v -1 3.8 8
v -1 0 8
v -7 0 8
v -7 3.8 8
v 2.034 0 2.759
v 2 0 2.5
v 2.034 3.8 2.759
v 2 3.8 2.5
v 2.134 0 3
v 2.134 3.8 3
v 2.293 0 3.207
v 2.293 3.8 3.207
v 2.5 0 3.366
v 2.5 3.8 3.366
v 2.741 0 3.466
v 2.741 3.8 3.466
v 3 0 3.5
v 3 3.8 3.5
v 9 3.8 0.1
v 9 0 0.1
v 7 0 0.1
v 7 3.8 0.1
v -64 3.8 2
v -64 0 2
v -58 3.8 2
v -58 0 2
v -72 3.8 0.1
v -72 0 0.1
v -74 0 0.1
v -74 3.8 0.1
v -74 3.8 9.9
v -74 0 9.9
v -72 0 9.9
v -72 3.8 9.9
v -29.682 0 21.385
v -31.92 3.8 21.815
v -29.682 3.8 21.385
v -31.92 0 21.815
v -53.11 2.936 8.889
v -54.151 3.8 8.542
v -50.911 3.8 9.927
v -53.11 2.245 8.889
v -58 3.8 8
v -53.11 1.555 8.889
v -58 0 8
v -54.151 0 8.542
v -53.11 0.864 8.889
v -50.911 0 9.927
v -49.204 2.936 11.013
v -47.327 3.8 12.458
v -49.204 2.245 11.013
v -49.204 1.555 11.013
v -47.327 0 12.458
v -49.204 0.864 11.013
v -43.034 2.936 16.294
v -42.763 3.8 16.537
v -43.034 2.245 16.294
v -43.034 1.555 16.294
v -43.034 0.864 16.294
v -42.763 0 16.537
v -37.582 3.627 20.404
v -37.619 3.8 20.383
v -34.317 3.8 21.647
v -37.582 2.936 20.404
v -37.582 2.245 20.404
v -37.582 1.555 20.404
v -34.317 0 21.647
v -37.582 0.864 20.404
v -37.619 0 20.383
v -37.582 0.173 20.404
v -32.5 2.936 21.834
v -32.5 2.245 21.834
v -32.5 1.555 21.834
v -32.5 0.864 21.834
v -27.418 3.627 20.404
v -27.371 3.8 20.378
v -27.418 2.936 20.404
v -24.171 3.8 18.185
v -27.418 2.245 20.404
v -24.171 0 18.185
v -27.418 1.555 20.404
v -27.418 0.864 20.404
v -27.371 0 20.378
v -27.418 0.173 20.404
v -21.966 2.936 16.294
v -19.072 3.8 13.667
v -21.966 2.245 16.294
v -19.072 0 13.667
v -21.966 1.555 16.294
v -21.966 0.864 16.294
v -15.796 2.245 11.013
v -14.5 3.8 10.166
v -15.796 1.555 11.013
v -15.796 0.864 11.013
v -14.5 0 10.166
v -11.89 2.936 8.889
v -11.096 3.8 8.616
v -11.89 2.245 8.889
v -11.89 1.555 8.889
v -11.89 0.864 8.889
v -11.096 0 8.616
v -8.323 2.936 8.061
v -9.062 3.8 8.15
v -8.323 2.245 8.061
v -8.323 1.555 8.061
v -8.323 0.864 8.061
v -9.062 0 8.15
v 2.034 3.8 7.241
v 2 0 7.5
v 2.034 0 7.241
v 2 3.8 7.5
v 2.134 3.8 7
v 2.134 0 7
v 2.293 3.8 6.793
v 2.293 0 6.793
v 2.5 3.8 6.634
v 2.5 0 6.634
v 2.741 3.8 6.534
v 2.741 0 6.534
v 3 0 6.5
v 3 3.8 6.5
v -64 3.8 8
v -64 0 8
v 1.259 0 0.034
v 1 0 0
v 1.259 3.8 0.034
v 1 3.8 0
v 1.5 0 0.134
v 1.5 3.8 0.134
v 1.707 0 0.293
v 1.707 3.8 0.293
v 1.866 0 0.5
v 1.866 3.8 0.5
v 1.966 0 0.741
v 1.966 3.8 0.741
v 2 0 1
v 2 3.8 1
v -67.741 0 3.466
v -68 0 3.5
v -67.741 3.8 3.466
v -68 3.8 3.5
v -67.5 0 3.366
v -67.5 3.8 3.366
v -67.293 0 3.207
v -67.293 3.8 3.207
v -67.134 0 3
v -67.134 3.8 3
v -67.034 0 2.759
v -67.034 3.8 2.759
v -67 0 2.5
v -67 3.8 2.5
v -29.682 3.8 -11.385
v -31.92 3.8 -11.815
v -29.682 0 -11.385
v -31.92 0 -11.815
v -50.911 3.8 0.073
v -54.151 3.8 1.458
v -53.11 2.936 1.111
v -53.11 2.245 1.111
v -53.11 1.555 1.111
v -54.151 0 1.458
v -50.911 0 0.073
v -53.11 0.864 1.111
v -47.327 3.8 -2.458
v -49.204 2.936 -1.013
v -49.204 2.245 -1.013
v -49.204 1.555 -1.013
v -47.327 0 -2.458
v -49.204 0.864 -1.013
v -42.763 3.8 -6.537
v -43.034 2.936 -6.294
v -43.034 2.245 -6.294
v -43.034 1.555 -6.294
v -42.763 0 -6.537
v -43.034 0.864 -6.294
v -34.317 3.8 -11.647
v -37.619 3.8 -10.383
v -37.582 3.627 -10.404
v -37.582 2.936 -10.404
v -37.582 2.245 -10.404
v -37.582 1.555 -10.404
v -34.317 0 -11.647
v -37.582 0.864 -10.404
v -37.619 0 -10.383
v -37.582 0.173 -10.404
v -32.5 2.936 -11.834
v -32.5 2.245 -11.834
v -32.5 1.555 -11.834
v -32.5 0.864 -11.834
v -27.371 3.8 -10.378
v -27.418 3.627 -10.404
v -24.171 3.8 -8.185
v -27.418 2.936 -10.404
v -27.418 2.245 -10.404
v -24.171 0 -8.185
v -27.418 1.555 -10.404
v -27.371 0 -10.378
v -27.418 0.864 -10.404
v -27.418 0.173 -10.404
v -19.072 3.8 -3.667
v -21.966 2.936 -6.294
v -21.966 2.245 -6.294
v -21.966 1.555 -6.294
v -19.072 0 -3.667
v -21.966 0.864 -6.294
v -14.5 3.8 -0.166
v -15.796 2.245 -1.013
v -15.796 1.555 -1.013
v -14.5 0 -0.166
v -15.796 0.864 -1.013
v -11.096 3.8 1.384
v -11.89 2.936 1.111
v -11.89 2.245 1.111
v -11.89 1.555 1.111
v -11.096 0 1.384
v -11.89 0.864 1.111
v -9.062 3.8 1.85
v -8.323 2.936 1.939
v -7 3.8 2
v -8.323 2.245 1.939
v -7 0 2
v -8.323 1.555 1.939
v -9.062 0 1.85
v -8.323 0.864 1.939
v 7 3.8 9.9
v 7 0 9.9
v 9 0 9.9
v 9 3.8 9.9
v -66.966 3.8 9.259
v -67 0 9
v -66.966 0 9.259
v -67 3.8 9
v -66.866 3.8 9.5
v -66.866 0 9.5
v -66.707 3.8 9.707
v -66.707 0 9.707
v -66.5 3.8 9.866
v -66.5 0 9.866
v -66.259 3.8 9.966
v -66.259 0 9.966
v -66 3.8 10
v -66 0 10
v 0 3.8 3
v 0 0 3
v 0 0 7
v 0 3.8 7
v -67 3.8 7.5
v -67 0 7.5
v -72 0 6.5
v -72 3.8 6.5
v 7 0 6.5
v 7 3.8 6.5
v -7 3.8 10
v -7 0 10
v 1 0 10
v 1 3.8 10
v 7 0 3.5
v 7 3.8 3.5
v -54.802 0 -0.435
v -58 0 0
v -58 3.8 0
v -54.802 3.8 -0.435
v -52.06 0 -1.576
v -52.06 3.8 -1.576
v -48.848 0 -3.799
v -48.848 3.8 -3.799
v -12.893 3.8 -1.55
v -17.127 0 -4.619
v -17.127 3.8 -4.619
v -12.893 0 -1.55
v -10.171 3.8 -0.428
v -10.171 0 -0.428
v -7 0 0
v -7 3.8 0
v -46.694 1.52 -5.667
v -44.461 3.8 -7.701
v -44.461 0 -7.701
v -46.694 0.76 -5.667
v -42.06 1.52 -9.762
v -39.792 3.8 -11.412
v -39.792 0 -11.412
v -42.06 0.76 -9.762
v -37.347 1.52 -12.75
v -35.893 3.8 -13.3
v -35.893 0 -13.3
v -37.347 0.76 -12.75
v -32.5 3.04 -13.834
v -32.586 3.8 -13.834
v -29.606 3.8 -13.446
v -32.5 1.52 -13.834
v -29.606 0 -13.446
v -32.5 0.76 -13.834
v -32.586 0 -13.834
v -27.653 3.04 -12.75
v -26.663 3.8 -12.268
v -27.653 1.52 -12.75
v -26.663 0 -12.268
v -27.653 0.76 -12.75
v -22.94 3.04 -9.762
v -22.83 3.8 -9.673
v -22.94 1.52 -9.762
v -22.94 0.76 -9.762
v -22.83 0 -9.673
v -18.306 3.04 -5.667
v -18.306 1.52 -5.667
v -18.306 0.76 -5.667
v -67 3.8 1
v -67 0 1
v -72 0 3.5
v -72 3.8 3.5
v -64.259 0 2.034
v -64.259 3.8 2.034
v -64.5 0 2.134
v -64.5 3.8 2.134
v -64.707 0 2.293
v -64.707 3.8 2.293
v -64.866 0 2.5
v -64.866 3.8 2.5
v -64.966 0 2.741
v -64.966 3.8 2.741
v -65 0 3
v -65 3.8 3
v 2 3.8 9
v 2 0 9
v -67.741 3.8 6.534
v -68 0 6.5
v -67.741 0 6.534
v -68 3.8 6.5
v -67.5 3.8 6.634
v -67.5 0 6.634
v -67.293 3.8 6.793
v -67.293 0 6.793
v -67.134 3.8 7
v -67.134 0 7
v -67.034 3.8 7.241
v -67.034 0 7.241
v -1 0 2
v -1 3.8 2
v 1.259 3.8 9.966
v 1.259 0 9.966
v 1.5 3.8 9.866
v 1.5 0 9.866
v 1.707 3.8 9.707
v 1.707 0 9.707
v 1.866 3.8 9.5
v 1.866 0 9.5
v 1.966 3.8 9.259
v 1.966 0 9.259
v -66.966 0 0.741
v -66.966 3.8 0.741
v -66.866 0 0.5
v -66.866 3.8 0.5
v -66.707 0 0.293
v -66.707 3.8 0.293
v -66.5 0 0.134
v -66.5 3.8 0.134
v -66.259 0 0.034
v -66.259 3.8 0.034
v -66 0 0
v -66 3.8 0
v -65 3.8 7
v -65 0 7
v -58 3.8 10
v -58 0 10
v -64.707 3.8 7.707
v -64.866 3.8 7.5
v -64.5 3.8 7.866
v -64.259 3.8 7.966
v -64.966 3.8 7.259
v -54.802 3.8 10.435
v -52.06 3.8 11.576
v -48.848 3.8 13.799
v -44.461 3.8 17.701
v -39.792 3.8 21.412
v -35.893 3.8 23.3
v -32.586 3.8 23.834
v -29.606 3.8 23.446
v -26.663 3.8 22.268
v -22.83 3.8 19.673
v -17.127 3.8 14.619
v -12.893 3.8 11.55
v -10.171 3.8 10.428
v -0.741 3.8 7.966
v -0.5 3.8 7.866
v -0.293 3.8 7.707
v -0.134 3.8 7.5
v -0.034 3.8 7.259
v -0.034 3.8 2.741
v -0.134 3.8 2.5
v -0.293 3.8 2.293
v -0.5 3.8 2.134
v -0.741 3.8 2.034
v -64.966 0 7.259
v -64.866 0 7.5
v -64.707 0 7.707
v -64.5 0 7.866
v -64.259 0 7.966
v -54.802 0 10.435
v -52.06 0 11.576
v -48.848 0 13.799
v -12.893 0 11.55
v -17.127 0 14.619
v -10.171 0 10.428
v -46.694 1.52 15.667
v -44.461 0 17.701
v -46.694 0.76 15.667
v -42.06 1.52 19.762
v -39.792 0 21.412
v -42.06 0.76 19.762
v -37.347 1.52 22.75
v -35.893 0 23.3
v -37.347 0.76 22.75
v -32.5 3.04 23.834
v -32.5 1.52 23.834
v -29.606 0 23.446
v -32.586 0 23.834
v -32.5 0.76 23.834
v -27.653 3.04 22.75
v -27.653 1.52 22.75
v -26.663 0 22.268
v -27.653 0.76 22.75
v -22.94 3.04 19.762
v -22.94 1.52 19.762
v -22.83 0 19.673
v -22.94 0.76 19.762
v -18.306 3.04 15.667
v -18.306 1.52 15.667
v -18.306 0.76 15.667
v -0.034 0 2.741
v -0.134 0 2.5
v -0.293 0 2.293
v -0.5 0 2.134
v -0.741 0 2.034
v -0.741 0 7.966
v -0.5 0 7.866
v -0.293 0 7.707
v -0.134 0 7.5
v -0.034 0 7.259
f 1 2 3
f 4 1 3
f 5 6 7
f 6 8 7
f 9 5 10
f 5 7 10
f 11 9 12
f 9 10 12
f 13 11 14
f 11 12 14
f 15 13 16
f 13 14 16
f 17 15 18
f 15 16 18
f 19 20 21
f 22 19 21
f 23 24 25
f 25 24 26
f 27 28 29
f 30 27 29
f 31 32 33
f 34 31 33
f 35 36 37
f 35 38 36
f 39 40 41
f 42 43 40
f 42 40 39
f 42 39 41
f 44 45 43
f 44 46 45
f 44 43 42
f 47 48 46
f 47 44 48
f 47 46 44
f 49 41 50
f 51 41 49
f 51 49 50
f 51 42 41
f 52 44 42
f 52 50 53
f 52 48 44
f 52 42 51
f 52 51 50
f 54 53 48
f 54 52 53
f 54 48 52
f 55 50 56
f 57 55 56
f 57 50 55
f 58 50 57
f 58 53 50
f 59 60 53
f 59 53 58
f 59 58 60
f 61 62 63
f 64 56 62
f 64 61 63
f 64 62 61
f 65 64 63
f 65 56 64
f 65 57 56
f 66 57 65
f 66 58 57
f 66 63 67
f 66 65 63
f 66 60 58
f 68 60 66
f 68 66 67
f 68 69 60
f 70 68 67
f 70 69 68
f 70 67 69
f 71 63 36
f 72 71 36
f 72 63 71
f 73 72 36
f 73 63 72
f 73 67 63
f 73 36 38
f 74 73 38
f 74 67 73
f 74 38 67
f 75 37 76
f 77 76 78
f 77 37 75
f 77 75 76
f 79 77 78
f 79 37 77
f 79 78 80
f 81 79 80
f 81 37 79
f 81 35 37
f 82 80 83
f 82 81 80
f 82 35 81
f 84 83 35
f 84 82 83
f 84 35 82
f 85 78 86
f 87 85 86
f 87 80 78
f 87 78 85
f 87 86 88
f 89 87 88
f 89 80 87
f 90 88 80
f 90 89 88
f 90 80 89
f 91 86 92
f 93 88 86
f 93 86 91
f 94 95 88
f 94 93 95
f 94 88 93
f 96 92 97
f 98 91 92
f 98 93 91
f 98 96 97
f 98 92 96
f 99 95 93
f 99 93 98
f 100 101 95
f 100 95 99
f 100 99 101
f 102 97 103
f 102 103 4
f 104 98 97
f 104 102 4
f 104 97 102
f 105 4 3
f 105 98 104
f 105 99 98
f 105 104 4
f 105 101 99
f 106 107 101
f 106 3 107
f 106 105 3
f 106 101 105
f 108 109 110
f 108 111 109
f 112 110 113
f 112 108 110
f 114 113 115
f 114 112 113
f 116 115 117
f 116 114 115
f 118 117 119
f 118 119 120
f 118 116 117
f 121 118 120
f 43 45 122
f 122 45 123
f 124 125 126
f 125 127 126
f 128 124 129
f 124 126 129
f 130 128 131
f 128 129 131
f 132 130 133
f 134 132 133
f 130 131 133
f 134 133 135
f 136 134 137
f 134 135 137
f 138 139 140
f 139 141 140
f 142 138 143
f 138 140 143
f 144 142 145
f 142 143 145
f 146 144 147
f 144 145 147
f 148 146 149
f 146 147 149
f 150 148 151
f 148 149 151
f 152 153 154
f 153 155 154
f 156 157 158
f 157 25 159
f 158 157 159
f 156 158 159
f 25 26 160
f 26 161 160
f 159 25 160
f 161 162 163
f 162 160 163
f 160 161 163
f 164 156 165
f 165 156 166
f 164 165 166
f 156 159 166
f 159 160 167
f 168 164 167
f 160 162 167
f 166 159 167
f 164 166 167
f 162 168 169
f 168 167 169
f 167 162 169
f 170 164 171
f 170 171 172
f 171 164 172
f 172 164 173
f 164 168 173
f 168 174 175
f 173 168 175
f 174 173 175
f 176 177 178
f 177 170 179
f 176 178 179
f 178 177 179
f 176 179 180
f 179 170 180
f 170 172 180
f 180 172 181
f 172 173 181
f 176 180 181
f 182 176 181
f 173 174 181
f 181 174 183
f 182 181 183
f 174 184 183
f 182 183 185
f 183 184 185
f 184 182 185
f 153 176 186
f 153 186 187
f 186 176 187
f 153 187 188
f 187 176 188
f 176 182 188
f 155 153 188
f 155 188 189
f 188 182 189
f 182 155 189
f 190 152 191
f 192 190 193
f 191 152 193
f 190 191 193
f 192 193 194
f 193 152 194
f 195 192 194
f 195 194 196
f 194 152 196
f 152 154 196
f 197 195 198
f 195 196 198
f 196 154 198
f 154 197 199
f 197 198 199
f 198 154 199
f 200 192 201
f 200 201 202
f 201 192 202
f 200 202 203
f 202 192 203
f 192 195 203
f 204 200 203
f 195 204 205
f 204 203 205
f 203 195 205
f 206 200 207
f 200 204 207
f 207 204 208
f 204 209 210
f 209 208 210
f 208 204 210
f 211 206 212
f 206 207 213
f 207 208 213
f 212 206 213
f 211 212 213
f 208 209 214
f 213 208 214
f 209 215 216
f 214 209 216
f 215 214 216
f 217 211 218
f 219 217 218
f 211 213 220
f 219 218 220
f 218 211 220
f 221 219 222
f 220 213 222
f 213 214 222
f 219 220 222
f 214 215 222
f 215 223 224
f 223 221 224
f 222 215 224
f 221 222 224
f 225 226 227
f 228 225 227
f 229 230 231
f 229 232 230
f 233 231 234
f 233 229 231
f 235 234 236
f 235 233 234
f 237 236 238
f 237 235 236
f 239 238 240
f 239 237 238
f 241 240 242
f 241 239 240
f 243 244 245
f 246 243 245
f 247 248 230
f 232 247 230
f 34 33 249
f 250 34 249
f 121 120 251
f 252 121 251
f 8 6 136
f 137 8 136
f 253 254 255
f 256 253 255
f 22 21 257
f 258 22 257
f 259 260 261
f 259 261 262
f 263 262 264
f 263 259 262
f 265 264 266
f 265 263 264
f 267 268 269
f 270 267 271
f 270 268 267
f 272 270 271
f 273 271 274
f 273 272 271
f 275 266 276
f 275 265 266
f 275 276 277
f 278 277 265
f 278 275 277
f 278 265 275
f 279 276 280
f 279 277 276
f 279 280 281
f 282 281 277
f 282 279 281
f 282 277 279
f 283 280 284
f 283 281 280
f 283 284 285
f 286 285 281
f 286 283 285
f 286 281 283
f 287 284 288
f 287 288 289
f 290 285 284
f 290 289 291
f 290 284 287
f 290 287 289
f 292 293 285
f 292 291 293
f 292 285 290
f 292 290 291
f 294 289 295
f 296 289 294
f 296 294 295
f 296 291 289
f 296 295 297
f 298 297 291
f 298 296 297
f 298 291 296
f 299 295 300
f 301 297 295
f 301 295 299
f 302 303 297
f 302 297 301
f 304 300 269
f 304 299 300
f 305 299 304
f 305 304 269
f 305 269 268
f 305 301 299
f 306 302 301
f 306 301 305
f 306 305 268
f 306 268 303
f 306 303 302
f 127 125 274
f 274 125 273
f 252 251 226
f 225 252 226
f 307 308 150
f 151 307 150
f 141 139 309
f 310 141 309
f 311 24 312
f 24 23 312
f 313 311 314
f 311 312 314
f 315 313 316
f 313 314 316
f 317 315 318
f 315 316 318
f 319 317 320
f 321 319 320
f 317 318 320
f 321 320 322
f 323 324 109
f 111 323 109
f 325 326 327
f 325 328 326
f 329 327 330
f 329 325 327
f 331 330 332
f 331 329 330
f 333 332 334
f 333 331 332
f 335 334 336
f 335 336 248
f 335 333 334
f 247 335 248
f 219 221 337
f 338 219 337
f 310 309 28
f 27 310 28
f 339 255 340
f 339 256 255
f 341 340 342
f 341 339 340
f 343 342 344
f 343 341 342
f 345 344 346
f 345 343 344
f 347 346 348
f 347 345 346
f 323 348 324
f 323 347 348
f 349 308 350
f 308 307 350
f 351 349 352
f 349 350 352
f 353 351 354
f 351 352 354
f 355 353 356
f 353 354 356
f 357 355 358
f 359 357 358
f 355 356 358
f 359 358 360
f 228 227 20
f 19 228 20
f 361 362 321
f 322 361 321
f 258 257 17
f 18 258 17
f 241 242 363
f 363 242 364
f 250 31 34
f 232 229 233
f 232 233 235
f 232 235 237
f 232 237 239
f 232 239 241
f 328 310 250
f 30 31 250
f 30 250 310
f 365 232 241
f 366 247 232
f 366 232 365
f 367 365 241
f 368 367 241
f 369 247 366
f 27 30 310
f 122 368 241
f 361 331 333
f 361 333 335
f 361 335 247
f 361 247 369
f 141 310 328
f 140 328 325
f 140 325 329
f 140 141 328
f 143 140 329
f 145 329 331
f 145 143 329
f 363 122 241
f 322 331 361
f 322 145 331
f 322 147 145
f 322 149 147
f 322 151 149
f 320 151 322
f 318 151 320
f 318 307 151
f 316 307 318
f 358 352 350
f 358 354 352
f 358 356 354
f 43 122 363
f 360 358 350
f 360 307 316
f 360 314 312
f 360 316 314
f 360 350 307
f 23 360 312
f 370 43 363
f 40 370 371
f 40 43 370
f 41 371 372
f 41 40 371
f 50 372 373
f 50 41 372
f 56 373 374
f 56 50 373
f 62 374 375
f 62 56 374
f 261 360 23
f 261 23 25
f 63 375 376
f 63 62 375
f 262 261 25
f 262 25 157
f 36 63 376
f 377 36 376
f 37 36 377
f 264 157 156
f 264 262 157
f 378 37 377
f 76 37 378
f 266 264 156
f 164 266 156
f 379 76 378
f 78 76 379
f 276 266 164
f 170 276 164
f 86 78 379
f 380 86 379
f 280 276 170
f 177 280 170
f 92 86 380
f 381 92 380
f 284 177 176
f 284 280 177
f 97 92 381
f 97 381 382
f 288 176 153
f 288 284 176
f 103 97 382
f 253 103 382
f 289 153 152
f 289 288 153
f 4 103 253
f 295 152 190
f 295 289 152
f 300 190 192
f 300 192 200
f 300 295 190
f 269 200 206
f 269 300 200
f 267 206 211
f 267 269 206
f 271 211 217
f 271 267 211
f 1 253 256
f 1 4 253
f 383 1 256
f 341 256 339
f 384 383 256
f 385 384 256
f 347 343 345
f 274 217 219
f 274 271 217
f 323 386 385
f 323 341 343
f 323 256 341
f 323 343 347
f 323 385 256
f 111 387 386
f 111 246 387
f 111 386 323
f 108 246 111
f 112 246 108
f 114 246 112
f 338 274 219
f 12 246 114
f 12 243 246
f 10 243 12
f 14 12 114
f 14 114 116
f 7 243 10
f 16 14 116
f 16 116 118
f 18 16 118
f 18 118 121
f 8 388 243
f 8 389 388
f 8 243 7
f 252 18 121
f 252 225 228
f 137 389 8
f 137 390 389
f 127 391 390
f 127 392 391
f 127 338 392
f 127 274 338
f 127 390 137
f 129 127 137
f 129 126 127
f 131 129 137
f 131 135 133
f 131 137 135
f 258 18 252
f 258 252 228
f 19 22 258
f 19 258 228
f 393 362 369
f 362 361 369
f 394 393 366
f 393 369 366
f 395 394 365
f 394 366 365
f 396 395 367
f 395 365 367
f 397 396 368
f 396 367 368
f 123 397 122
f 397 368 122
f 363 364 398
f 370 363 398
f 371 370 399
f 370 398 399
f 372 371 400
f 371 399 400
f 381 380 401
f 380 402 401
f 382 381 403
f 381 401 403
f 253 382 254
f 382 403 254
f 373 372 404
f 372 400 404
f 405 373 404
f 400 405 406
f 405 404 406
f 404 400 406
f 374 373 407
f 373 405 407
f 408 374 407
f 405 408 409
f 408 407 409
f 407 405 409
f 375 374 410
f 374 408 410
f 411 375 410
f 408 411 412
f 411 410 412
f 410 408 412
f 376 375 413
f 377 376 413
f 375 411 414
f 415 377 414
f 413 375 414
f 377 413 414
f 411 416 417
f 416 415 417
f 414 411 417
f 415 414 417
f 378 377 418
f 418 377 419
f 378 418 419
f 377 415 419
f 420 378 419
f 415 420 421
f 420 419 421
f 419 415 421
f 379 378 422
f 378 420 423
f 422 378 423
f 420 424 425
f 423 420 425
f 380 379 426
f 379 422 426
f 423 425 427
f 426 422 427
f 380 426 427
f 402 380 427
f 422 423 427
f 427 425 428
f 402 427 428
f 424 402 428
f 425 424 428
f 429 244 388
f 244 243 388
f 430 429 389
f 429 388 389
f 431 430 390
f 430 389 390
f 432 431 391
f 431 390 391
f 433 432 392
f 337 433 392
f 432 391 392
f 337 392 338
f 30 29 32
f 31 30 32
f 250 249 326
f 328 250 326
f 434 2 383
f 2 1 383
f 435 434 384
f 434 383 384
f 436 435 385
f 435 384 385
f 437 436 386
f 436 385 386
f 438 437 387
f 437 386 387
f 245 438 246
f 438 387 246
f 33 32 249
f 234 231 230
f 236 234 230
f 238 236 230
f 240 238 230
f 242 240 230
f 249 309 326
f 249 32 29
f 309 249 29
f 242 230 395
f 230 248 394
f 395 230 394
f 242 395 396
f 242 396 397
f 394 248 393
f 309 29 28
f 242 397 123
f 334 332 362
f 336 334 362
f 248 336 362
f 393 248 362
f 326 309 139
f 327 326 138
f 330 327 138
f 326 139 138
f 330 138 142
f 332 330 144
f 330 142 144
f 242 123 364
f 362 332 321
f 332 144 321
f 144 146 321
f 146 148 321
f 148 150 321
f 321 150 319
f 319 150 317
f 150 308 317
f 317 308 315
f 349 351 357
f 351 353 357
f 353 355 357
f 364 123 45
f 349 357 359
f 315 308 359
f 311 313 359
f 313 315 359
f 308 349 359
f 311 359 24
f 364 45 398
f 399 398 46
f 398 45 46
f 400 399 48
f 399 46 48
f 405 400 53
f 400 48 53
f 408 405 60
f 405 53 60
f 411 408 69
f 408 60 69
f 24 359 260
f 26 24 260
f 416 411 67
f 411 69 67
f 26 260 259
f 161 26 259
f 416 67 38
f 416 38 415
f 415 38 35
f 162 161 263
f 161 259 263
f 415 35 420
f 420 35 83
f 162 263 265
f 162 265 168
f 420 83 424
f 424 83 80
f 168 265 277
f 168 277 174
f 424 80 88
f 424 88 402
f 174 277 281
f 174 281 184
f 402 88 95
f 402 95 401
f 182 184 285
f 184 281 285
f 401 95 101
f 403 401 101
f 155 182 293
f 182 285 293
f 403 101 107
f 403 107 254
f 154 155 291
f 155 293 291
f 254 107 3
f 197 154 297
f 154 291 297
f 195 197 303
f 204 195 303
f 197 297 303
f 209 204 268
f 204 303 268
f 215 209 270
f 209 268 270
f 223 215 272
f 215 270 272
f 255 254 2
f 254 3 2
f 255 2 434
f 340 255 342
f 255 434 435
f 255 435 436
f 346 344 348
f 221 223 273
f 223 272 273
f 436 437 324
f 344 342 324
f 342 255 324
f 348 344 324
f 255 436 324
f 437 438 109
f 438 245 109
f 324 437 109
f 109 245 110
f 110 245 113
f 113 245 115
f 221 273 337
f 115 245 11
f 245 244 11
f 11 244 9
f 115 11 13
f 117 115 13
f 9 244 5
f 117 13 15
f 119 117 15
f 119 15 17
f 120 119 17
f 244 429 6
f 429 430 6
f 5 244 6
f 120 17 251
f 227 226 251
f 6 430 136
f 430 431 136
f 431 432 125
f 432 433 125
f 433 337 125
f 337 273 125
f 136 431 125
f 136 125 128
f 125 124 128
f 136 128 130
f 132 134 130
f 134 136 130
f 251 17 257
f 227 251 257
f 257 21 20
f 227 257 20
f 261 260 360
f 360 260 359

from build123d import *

# Parameters (mm, degrees)
BOSS_EXTRUDE1_DEPTH = 3.8
FILLET1_R           = 1
FILLET2_R           = 1


# Read off the part's stored shape, not the designer's step: Boss-Extrude1
with BuildPart() as part:
    # Boss-Extrude1 outline → Boss-Extrude1 (new body)
    with BuildSketch(Plane(origin=(0, 0, 0), x_dir=(1, 0, 0), z_dir=(0, 1, 0))):
        with BuildLine():
            Line((-67, -3.5), (-72, -3.5))
            Line((-72, -3.5), (-72, -0.1))
            Line((-72, -0.1), (-74, -0.1))
            Line((-74, -0.1), (-74, -9.9))
            Line((-74, -9.9), (-72, -9.9))
            Line((-72, -9.9), (-72, -6.5))
            Line((-72, -6.5), (-67, -6.5))
            Line((-67, -6.5), (-67, -10))
            Line((-67, -10), (-58, -10))
            add(Edge.make_bspline(
                [(-58, -10), (-43, -10), (-43, -32.135135135), (-22, -32.135135135), (-22, -10), (-7, -10)],
                knots=[0, 0, 0, 0, 0, 0, 1, 1, 1, 1, 1, 1], degree=5))
            Line((-7, -10), (2, -10))
            Line((2, -10), (2, -6.5))
            Line((2, -6.5), (7, -6.5))
            Line((7, -6.5), (7, -9.9))
            Line((7, -9.9), (9, -9.9))
            Line((9, -9.9), (9, -0.1))
            Line((9, -0.1), (7, -0.1))
            Line((7, -0.1), (7, -3.5))
            Line((7, -3.5), (2, -3.5))
            Line((2, -3.5), (2, 0))
            Line((2, 0), (-7, 0))
            add(Edge.make_bspline(
                [(-58, 0), (-43, 0), (-43, 22.135135135), (-22, 22.135135135), (-22, 0), (-7, 0)],
                knots=[0, 0, 0, 0, 0, 0, 1, 1, 1, 1, 1, 1], degree=5))
            Line((-58, 0), (-67, 0))
            Line((-67, 0), (-67, -3.5))
        make_face()
        with BuildLine():
            Line((-7, -2), (0, -2))
            Line((0, -2), (0, -8))
            Line((0, -8), (-7, -8))
            add(Edge.make_bspline(
                [(-58, -8), (-57.558618283, -8), (-56.661274976, -8.041762499), (-54.994490556, -8.279551492), (-53.066007456, -8.837716096), (-51.014248285, -9.814804326), (-48.564524406, -11.386984706), (-45.904801681, -13.642773041), (-43.012545098, -16.349497976), (-40.249484403, -18.726076341), (-37.565229513, -20.52340788), (-34.980845565, -21.601809204), (-32.5, -21.950784587), (-30.019154435, -21.601809204), (-27.434770487, -20.52340788), (-24.750515597, -18.726076341), (-21.987454902, -16.349497976), (-19.095198319, -13.642773041), (-16.435475594, -11.386984706), (-13.985751715, -9.814804326), (-11.933992544, -8.837716096), (-10.005509444, -8.279551492), (-8.338725024, -8.041762499), (-7.441381717, -8), (-7, -8)],
                knots=[0, 0, 0, 0, 0.015625, 0.03125, 0.0625, 0.09375, 0.125, 0.1875, 0.25, 0.3125, 0.375, 0.4375, 0.5, 0.5625, 0.625, 0.6875, 0.75, 0.8125, 0.875, 0.90625, 0.9375, 0.96875, 0.984375, 1, 1, 1, 1], degree=3))
            Line((-58, -8), (-65, -8))
            Line((-65, -8), (-65, -2))
            Line((-65, -2), (-58, -2))
            add(Edge.make_bspline(
                [(-58, -2), (-57.558618283, -2), (-56.661274976, -1.958237501), (-54.994490556, -1.720448508), (-53.066007456, -1.162283904), (-51.014248285, -0.185195674), (-48.564524406, 1.386984706), (-45.904801681, 3.642773041), (-43.012545098, 6.349497976), (-40.249484403, 8.726076341), (-37.565229513, 10.52340788), (-34.980845565, 11.601809204), (-32.5, 11.950784587), (-30.019154435, 11.601809204), (-27.434770487, 10.52340788), (-24.750515597, 8.726076341), (-21.987454902, 6.349497976), (-19.095198319, 3.642773041), (-16.435475594, 1.386984706), (-13.985751715, -0.185195674), (-11.933992544, -1.162283904), (-10.005509444, -1.720448508), (-8.338725024, -1.958237501), (-7.441381717, -2), (-7, -2)],
                knots=[0, 0, 0, 0, 0.015625, 0.03125, 0.0625, 0.09375, 0.125, 0.1875, 0.25, 0.3125, 0.375, 0.4375, 0.5, 0.5625, 0.625, 0.6875, 0.75, 0.8125, 0.875, 0.90625, 0.9375, 0.96875, 0.984375, 1, 1, 1, 1], degree=3))
        make_face(mode=Mode.SUBTRACT)
    extrude(amount=BOSS_EXTRUDE1_DEPTH)

    # Fillet1
    fillet1_edges = [part.edges().sort_by_distance(p)[0] for p in [
        (-67, 1.9, 3.5),
        (-67, 1.9, 0),
        (2, 1.9, 0),
        (2, 1.9, 3.5),
        (2, 1.9, 6.5),
        (2, 1.9, 10),
        (-67, 1.9, 10),
        (-67, 1.9, 6.5),
    ]]
    fillet(fillet1_edges, radius=FILLET1_R)

    # Fillet2
    fillet2_edges = [part.edges().sort_by_distance(p)[0] for p in [
        (-65, 1.9, 2),
        (-65, 1.9, 8),
        (0, 1.9, 8),
        (0, 1.9, 2),
    ]]
    fillet(fillet2_edges, radius=FILLET2_R)


solid = part.part
